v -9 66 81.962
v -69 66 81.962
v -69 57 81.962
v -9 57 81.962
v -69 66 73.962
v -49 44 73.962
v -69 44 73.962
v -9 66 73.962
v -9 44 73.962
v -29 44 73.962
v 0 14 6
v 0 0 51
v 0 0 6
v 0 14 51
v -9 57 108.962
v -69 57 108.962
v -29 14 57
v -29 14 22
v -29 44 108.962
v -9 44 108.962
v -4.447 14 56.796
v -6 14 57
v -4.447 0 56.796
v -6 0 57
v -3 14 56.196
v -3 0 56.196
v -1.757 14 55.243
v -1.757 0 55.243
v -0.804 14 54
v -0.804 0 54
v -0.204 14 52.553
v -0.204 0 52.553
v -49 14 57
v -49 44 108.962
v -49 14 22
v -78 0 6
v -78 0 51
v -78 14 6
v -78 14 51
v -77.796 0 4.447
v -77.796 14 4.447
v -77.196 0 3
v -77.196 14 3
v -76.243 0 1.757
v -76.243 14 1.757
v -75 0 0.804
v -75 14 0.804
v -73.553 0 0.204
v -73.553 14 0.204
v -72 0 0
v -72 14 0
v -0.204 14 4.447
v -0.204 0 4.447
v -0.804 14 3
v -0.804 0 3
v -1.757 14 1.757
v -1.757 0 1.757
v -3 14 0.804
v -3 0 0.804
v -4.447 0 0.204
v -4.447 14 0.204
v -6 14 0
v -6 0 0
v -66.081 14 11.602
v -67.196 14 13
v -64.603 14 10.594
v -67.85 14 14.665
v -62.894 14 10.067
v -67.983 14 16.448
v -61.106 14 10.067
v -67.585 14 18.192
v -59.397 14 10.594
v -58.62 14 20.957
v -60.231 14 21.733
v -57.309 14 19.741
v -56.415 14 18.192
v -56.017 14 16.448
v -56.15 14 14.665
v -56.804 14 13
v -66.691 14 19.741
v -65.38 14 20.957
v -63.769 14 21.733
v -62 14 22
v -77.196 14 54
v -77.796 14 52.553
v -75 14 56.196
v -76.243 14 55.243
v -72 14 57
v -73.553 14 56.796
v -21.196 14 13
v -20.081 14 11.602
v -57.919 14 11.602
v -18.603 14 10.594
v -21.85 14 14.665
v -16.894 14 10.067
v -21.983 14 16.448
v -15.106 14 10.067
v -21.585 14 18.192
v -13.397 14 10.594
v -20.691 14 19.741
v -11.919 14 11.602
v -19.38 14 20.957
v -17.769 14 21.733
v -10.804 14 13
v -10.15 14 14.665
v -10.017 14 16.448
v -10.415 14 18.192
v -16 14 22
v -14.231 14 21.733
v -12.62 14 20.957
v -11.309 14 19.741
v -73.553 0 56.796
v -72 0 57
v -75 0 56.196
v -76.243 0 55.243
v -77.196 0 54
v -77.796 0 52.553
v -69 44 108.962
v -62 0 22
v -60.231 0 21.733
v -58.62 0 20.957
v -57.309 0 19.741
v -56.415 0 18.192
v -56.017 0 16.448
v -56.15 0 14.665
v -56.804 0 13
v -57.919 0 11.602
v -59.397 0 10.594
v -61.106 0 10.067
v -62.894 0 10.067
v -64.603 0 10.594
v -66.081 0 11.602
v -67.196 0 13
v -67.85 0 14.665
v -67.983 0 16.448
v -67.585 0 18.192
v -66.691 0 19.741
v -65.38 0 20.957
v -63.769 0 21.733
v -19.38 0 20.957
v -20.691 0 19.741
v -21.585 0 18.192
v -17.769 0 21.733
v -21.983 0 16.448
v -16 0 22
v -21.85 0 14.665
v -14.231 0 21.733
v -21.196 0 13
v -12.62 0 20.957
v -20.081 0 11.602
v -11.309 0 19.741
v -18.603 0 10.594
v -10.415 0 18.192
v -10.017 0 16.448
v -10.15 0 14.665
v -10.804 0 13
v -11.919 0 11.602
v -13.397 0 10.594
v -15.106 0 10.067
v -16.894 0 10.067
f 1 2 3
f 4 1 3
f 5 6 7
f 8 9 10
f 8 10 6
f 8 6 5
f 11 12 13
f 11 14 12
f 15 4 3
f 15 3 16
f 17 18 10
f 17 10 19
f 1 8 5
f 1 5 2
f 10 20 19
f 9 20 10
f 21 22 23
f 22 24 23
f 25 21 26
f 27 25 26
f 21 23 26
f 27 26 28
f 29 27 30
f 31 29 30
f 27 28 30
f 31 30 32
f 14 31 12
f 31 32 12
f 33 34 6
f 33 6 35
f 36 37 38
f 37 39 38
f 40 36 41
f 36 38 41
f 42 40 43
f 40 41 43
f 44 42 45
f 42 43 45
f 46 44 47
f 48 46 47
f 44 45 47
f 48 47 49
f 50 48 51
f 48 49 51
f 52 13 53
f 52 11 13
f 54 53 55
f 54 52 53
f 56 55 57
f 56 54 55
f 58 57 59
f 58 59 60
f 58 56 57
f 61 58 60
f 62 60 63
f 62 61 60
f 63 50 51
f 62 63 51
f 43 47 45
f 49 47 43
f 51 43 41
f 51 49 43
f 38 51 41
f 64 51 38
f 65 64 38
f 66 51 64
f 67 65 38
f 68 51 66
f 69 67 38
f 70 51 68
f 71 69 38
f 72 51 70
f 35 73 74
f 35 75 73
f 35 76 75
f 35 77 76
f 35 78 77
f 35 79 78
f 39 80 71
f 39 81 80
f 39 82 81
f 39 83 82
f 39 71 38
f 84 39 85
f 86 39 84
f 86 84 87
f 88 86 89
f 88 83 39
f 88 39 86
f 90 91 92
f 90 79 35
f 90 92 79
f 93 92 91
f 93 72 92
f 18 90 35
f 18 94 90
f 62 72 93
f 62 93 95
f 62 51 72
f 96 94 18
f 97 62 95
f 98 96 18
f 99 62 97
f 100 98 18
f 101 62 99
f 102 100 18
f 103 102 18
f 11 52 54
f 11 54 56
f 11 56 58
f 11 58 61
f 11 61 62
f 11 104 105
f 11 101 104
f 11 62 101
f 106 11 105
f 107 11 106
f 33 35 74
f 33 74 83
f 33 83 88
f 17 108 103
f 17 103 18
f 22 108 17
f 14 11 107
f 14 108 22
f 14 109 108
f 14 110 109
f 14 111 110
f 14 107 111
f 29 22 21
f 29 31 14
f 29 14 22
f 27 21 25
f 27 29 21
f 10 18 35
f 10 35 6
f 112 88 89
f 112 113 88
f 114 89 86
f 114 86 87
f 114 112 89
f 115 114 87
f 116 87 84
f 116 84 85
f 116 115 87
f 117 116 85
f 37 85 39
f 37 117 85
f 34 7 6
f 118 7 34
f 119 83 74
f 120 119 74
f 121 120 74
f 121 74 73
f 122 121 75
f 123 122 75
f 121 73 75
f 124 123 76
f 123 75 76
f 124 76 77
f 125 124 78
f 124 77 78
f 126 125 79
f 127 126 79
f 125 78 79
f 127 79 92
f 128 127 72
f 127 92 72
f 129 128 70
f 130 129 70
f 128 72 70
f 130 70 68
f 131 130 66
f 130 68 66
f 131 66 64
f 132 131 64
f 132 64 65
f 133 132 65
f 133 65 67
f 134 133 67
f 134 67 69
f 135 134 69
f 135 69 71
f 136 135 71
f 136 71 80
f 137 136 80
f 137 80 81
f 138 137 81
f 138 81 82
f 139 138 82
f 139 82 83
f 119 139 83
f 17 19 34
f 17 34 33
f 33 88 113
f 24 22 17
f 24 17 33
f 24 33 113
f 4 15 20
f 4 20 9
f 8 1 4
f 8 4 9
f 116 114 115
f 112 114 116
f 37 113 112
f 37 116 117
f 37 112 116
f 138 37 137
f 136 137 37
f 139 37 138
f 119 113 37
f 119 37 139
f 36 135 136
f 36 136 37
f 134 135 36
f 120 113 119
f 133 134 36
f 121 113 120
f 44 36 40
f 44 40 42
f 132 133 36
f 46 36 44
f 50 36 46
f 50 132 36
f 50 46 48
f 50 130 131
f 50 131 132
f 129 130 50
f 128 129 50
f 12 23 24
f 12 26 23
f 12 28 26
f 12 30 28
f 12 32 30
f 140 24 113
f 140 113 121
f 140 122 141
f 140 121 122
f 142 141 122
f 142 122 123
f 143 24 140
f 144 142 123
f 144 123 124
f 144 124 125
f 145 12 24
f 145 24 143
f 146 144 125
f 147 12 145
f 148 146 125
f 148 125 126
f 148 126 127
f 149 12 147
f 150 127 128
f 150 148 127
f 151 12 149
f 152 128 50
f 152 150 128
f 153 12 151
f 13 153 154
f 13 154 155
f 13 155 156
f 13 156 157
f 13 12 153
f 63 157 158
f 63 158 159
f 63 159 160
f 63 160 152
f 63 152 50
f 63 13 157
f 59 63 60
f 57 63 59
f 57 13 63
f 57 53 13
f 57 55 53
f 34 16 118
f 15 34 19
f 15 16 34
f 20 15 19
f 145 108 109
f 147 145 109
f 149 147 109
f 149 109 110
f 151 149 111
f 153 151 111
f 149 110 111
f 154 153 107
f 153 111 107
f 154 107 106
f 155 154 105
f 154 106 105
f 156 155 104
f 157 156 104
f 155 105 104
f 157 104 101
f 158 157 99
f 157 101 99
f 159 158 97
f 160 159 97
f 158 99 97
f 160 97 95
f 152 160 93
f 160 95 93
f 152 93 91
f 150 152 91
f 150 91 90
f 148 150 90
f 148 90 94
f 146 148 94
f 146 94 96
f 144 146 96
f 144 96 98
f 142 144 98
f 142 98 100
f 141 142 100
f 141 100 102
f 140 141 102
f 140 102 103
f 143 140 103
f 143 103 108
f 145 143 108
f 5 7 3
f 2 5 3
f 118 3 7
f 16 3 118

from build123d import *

# Parameters (mm, degrees)
ESTRUSIONE_ESTRUSIONE1_DEPTH = 78
TAGLIO_ESTRUSIONE1_DEPTH     = 29
TAGLIO_ESTRUSIONE2_DEPTH     = 29
SCHIZZO4_W                   = 35
SCHIZZO4_H                   = 22
TAGLIO_ESTRUSIONE3_DEPTH     = 9
SCHIZZO5_W                   = 35
SCHIZZO5_H                   = 22
TAGLIO_ESTRUSIONE4_DEPTH     = 9
SCHIZZO6_R                   = 6
TAGLIO_ESTRUSIONE5_DEPTH     = 144.738003889
RACCORDO1_R                  = 6


with BuildPart() as part:
    # Schizzo1 → Estrusione-Estrusione1 (new body)
    with BuildSketch(Plane(origin=(0, 0, 0), x_dir=(0, 0, -1), z_dir=(1, 0, 0))):
        Polygon((-57, 0), (0, 0), (0, 14), (-22, 14), (-73.961524227, 44), (-73.961524227, 66), (-81.961524227, 66), (-81.961524227, 57), (-108.961524227, 57), (-108.961524227, 44), (-57, 14), align=None)
    extrude(amount=-ESTRUSIONE_ESTRUSIONE1_DEPTH)

    # Schizzo2 → Taglio-Estrusione1 (cut)
    with BuildSketch(Plane(origin=(0, 0, 0), x_dir=(0, 0, -1), z_dir=(1, 0, 0))):
        Polygon((-22, 14), (-57, 14), (-108.961524227, 44), (-73.961524227, 44), align=None)
    extrude(amount=-TAGLIO_ESTRUSIONE1_DEPTH, mode=Mode.SUBTRACT)

    # Schizzo3 → Taglio-Estrusione2 (cut)
    with BuildSketch(Plane.ZY.offset(78)):
        Polygon((57, 14), (22, 14), (73.961524227, 44), (108.961524227, 44), align=None)
    extrude(amount=-TAGLIO_ESTRUSIONE2_DEPTH, mode=Mode.SUBTRACT)

    # Schizzo4 → Taglio-Estrusione3 (cut)
    with BuildSketch(Plane.ZY.offset(78)):
        with Locations((91.461524227, 55)):
            Rectangle(SCHIZZO4_W, SCHIZZO4_H)
    extrude(amount=-TAGLIO_ESTRUSIONE3_DEPTH, mode=Mode.SUBTRACT)

    # Schizzo5 → Taglio-Estrusione4 (cut)
    with BuildSketch(Plane(origin=(0, 0, 0), x_dir=(0, 0, -1), z_dir=(1, 0, 0))):
        with Locations((-91.461524227, 55)):
            Rectangle(SCHIZZO5_W, SCHIZZO5_H)
    extrude(amount=-TAGLIO_ESTRUSIONE4_DEPTH, mode=Mode.SUBTRACT)

    # Schizzo6 → Taglio-Estrusione5 (cut, through all)
    with BuildSketch(Plane(origin=(0, 14, 0), x_dir=(1, 0, 0), z_dir=(0, 1, 0))):
        with Locations(Location((-16, -16, 0), (0, 0, 270))):
            Circle(SCHIZZO6_R)
        with Locations(Location((-62, -16, 0), (0, 0, 270))):
            Circle(SCHIZZO6_R)
    extrude(amount=-TAGLIO_ESTRUSIONE5_DEPTH, mode=Mode.SUBTRACT)

    # Raccordo1
    raccordo1_edges = [part.edges().sort_by_distance(p)[0] for p in [
        (0, 7, 0),
        (0, 7, 57),
        (-78, 7, 57),
        (-78, 7, 0),
    ]]
    fillet(raccordo1_edges, radius=RACCORDO1_R)


solid = part.part
